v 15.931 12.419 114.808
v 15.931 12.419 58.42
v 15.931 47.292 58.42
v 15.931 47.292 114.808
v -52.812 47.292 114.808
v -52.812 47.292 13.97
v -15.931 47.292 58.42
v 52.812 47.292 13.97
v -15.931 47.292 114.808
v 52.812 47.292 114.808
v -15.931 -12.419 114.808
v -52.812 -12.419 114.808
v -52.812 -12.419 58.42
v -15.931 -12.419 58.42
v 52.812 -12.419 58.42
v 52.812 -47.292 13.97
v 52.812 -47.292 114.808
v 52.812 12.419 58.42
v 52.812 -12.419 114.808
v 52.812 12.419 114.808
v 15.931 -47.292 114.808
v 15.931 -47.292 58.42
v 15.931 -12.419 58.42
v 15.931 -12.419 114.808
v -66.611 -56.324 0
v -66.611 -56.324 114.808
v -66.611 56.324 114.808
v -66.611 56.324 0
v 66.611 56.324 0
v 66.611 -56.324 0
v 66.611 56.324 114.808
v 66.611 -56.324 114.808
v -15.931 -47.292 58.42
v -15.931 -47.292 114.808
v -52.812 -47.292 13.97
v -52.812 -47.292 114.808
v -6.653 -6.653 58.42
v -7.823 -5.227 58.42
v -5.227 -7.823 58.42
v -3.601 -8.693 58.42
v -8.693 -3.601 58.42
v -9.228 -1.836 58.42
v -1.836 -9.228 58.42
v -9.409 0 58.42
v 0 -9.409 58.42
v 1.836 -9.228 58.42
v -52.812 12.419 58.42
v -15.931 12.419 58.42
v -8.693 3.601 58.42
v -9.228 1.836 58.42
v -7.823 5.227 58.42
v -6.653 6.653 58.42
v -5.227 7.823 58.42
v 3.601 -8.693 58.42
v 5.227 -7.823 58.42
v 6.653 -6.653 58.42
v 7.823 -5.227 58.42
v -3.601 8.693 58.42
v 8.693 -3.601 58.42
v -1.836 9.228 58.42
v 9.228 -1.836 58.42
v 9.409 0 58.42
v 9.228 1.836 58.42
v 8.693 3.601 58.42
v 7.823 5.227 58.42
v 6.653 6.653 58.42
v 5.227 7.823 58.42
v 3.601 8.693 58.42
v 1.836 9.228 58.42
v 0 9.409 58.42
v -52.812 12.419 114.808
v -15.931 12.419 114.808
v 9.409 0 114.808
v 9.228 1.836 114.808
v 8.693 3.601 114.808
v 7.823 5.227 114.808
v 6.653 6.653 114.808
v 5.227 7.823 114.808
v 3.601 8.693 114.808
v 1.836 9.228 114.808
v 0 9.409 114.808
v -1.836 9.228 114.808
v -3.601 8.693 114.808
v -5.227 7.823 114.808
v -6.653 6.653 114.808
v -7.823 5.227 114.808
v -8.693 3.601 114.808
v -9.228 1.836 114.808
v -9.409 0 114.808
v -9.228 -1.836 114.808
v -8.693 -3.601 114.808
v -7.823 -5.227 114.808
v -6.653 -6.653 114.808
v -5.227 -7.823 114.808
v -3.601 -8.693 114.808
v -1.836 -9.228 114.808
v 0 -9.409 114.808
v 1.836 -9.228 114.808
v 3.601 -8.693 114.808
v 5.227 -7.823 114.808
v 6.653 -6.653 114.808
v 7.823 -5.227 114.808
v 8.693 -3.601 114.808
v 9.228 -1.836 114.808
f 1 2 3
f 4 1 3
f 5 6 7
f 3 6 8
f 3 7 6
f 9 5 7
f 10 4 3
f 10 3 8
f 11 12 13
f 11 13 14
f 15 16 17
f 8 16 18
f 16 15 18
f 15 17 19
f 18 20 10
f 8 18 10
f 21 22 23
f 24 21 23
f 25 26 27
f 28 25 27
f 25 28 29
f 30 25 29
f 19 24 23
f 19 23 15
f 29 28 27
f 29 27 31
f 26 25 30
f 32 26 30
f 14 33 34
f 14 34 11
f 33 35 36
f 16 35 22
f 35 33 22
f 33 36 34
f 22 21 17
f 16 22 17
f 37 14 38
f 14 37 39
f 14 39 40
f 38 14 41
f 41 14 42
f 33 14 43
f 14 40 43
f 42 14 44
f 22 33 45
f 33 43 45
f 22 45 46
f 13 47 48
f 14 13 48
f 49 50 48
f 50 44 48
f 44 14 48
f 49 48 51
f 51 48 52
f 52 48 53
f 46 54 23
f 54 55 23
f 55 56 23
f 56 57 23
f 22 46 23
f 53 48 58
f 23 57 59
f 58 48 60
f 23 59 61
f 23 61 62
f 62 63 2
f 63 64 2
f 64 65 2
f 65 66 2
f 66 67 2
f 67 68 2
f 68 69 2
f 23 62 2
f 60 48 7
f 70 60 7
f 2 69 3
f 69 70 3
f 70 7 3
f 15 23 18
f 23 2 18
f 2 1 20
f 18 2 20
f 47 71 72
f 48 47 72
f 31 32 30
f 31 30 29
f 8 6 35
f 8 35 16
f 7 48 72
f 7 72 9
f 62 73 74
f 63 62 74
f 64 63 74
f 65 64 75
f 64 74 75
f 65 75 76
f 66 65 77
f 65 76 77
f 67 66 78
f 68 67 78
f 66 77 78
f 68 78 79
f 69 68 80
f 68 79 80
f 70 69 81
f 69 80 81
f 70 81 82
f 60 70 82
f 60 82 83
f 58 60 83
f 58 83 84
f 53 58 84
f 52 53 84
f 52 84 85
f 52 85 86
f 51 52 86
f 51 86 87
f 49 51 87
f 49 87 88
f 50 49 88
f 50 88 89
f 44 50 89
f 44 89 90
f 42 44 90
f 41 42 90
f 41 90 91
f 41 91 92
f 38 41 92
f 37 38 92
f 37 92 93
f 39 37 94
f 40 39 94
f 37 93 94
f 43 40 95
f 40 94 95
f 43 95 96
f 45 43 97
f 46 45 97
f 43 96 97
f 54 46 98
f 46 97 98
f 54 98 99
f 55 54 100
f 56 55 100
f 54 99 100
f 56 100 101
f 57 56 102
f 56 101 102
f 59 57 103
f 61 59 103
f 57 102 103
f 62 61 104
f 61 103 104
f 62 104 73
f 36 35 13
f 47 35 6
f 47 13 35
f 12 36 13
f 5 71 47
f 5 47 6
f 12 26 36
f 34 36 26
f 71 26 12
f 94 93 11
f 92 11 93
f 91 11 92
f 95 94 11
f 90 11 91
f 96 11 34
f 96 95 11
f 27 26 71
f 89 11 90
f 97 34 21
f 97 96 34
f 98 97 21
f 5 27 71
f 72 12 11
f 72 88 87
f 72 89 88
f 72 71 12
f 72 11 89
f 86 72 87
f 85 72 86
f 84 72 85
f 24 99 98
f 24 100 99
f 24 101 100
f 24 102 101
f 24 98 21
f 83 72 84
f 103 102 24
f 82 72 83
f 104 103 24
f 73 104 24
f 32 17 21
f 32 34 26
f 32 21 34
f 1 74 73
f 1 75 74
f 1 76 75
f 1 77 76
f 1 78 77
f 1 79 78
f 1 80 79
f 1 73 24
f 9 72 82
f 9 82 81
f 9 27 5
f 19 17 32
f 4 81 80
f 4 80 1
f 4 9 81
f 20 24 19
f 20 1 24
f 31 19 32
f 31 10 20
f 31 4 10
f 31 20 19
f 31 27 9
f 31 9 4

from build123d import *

# Parameters (mm, degrees)
F0_W     = 133.2214027643
F0_H     = 112.6486063004
F1_DEPTH = 114.808
F2_W     = 105.6237369776
F2_H     = 94.5846736431
F3_DEPTH = 100.838
F4_W     = 36.8804913014
F4_H     = 24.8378776014
F4_W_2   = 31.8627543747
F4_H_2   = 34.8733980209
F5_DEPTH = 56.388
F6_R     = 9.4091261345
F7_DEPTH = 94.742


with BuildPart() as f1:
    # F0 (on Top) → F1 (new body)
    with BuildSketch(Plane.XY):
        Rectangle(F0_W, F0_H)
    extrude(amount=F1_DEPTH)

    # F2 (on face) → F3 (cut)
    with BuildSketch(Plane.XY.offset(114.808)):
        Rectangle(F2_W, F2_H)
    extrude(amount=-F3_DEPTH, mode=Mode.SUBTRACT)

    # F4 (on face) → F5 (join)
    with BuildSketch(Plane.XY.offset(114.808)):
        with Locations((-34.3716228381, 0)):
            Rectangle(F4_W, F4_H)
        with Locations((34.3716228381, 0)):
            Rectangle(F4_W, F4_H)
        with Locations((0, 29.8556378111)):
            Rectangle(F4_W_2, F4_H_2)
        with Locations((0, -29.8556378111)):
            Rectangle(F4_W_2, F4_H_2)
        Rectangle(F4_W_2, F4_H)
    extrude(amount=-F5_DEPTH)

    # F6 (on face) → F7 (cut)
    with BuildSketch(Plane.XY.offset(114.808)):
        Circle(F6_R)
    extrude(amount=-F7_DEPTH, mode=Mode.SUBTRACT)


solid = f1.part
